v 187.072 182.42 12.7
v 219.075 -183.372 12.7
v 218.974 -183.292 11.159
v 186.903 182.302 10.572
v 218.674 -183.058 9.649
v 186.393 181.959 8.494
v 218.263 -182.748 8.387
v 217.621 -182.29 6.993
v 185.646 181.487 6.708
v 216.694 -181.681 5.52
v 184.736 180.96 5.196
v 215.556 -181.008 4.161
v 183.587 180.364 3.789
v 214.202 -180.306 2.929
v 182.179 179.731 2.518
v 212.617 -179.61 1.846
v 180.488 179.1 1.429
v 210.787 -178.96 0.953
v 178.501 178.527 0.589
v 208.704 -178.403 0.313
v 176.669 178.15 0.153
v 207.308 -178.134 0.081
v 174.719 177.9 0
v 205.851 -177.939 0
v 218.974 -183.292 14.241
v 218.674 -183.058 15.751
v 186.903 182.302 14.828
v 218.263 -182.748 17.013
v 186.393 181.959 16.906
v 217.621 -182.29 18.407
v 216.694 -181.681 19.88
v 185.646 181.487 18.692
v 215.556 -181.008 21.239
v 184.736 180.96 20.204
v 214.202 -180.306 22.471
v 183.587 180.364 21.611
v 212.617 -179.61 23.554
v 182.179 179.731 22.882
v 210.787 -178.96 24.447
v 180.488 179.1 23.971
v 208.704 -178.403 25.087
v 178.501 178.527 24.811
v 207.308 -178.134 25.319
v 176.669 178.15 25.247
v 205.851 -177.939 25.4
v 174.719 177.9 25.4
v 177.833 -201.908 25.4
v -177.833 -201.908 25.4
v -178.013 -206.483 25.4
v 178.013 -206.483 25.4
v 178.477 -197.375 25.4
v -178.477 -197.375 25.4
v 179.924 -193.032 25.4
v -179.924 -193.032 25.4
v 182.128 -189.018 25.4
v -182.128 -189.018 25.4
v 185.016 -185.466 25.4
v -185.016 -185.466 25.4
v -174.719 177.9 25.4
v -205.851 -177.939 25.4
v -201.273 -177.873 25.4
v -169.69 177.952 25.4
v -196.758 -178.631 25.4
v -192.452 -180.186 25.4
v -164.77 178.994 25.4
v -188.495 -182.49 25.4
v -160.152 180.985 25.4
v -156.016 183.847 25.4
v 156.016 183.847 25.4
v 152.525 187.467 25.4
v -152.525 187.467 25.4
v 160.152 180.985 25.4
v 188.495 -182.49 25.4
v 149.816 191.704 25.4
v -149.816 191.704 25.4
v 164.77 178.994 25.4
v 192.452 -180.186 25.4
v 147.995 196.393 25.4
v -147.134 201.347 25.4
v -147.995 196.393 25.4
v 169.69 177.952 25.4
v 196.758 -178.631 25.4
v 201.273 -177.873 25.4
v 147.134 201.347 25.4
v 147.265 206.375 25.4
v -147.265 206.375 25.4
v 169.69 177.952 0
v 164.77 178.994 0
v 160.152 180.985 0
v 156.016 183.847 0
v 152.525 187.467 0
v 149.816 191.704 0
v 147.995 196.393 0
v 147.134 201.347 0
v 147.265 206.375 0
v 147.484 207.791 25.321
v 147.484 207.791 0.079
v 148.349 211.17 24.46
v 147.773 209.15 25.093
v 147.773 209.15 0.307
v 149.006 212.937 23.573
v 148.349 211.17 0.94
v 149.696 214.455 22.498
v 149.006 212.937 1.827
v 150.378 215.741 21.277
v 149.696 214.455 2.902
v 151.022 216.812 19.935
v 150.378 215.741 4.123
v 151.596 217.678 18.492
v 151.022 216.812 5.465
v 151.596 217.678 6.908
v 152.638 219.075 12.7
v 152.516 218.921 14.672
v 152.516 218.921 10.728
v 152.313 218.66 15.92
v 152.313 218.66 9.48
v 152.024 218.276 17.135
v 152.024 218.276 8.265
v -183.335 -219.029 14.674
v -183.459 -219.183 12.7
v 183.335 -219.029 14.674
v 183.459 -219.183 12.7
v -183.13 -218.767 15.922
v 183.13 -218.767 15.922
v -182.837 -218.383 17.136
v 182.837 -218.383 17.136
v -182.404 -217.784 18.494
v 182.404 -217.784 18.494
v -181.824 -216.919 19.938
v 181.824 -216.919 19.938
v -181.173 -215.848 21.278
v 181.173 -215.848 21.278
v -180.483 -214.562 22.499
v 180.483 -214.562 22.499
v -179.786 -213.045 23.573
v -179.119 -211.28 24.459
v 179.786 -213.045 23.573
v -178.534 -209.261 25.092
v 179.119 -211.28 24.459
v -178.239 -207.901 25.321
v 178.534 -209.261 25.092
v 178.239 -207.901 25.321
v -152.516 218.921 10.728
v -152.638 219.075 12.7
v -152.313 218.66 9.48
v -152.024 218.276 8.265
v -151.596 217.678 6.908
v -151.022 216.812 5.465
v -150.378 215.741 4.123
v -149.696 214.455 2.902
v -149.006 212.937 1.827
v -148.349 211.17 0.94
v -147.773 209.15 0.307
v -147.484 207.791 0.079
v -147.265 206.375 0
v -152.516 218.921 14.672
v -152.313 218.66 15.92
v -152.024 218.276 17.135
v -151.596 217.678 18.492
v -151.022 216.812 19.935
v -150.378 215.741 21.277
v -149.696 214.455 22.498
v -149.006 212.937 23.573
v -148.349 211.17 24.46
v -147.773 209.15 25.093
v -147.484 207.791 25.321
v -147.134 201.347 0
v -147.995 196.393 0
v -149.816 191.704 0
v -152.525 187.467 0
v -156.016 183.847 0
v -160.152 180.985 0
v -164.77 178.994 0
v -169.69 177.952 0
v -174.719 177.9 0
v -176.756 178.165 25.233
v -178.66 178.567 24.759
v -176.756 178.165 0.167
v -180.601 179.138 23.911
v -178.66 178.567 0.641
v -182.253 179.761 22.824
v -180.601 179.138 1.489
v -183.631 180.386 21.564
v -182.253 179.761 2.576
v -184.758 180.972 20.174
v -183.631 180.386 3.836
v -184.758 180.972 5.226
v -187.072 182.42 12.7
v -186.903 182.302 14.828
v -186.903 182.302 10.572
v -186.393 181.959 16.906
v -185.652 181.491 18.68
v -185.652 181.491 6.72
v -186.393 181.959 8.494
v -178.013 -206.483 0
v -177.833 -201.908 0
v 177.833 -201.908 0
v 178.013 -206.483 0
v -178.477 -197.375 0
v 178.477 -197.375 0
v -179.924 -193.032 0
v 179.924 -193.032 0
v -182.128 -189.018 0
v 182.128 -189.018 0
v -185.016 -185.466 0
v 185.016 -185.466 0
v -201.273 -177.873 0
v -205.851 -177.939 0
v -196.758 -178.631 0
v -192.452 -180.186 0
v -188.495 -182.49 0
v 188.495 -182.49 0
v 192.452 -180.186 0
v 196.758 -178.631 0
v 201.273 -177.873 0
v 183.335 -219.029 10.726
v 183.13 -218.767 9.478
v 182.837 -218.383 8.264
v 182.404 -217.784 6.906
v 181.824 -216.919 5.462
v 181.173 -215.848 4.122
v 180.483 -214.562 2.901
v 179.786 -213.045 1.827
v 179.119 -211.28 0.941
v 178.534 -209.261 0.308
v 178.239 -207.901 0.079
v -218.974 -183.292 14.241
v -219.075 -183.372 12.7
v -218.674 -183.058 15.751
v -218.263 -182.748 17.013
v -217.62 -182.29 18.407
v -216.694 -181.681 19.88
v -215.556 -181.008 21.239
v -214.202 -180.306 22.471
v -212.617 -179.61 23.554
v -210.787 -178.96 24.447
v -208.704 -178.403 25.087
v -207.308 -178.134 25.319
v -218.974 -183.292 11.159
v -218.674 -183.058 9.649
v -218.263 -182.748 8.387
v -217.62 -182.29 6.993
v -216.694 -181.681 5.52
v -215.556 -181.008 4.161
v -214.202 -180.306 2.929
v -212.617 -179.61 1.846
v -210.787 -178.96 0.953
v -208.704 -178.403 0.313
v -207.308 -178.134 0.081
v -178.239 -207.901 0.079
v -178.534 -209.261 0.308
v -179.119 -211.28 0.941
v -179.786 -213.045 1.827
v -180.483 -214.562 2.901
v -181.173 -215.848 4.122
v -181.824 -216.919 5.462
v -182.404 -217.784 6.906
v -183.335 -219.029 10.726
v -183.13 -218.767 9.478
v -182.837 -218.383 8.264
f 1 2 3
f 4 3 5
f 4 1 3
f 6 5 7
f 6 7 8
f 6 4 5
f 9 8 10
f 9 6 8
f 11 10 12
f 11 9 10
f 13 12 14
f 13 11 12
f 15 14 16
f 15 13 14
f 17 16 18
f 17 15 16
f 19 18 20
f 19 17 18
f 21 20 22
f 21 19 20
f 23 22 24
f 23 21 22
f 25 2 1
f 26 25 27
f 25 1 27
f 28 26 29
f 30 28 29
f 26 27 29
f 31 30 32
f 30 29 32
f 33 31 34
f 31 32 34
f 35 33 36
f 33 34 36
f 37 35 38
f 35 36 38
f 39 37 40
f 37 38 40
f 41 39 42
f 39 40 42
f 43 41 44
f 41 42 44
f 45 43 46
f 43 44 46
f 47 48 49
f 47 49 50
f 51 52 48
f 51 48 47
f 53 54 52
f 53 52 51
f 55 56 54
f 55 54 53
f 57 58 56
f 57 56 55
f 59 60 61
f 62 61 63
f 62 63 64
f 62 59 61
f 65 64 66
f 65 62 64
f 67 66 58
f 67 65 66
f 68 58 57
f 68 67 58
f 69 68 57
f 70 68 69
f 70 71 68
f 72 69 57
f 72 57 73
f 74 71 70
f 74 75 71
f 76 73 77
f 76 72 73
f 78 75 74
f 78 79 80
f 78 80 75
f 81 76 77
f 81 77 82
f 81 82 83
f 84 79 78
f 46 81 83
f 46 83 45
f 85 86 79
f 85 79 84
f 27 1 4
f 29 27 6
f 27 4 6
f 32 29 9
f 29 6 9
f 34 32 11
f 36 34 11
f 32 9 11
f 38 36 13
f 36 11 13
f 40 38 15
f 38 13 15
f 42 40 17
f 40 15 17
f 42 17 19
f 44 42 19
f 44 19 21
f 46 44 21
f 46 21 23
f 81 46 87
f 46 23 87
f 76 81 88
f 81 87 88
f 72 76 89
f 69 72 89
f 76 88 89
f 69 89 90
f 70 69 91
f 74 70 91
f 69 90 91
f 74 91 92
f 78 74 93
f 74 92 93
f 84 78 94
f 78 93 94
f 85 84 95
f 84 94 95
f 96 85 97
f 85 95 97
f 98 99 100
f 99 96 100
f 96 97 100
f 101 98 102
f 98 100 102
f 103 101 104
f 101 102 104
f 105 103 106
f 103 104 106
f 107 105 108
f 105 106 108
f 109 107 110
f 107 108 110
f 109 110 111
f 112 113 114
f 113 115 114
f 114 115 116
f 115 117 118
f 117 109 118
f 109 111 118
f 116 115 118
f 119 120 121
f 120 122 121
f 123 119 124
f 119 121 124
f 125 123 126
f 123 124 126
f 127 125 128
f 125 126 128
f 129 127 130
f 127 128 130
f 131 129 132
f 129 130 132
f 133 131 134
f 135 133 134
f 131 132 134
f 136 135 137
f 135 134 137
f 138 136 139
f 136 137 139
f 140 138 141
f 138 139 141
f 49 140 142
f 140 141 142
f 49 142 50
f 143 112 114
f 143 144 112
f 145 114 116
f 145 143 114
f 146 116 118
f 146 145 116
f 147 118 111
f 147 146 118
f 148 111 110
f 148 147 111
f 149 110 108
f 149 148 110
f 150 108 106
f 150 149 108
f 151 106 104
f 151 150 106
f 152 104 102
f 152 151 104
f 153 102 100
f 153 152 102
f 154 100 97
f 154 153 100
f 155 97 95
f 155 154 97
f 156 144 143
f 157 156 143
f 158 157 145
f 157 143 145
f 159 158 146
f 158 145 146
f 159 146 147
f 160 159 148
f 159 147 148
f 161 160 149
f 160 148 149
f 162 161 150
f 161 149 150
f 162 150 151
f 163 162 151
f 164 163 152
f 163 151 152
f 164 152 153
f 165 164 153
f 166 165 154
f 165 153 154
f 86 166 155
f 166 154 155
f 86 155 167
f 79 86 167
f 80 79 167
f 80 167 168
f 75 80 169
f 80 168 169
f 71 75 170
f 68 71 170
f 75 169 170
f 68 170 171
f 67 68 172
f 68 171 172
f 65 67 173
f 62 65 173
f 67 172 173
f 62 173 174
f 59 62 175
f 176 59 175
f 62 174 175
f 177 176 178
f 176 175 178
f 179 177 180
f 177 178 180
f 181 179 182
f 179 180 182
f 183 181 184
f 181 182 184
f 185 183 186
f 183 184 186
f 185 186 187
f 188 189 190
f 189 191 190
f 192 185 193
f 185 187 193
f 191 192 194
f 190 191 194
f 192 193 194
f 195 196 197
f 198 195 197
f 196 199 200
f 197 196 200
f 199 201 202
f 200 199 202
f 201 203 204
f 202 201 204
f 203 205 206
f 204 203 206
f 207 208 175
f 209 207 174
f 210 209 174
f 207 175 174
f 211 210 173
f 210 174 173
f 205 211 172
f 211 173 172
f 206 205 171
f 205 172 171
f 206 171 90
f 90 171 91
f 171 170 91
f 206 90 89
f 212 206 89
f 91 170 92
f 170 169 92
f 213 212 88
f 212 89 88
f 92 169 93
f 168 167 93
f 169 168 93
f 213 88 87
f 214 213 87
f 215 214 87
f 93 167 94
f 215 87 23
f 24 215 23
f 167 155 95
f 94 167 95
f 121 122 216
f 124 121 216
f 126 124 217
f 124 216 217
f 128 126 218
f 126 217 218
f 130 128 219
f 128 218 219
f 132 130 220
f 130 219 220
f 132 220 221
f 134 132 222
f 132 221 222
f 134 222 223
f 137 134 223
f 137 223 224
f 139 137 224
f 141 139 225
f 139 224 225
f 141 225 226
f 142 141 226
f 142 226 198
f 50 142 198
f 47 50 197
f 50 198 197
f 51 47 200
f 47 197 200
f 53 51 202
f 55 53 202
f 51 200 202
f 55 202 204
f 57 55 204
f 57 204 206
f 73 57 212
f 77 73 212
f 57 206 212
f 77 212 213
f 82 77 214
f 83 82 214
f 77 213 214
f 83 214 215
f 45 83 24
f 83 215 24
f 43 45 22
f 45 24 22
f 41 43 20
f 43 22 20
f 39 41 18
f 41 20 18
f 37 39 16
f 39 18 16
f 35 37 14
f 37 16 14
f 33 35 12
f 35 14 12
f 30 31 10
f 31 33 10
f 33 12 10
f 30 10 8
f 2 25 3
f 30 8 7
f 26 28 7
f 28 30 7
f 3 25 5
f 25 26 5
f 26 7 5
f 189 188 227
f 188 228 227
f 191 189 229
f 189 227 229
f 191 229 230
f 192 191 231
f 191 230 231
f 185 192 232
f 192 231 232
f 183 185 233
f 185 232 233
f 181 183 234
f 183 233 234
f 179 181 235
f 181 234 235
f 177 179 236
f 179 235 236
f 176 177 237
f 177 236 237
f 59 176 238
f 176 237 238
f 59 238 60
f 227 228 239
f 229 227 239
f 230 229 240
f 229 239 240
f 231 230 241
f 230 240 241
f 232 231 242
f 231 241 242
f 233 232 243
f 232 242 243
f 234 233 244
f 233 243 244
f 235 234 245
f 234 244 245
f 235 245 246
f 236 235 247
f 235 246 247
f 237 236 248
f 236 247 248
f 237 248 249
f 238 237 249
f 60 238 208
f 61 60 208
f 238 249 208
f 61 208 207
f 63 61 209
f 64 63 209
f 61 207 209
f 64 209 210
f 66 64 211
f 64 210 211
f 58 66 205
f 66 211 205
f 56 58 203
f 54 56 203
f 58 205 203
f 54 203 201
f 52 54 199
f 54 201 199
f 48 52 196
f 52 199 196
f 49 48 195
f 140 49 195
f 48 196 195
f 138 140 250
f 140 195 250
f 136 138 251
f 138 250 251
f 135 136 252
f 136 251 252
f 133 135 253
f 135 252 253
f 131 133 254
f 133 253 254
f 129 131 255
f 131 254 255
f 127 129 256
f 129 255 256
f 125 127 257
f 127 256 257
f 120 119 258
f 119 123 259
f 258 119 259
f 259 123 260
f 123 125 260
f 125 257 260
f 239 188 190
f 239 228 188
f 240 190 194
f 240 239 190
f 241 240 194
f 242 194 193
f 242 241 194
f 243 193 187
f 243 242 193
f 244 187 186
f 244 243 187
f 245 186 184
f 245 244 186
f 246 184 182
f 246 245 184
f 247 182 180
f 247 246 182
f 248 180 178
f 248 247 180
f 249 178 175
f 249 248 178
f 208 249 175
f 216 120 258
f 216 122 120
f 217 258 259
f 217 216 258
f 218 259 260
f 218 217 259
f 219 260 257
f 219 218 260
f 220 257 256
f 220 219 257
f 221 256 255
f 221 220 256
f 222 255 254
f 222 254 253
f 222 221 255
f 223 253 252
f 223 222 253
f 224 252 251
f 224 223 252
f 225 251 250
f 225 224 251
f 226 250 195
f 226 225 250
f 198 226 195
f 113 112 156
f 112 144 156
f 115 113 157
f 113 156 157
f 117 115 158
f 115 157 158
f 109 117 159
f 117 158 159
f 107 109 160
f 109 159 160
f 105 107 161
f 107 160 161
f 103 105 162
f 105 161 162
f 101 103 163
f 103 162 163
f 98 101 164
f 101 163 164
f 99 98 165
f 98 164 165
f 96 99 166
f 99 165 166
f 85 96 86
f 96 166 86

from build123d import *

# Parameters (mm, degrees)
F1_DEPTH = 25.4
F2_R     = 12.69999


# Not quite as in the source:
# - a fillet or chamfer is up to 0.001 mm smaller than in the source, because OpenCascade refuses the exact size


with BuildPart() as f1:
    # F0 (on Top) → F1 (new body)
    with BuildSketch(Plane.XY):
        with BuildLine():
            ThreePointArc((-219.075, -183.3721313551), (-185.1905403178, -185.2885689585), (-183.4590722629, -219.182983829))
            Line((-183.4590722629, -219.182983829), (183.4590722629, -219.182983829))
            ThreePointArc((183.4590722629, -219.182983829), (185.1905403178, -185.2885689585), (219.075, -183.3721313551))
            Line((219.075, -183.3721313551), (187.072348327, 182.4198510941))
            ThreePointArc((187.072348327, 182.4198510941), (153.9534082329, 185.8090843811), (152.6381313551, 219.075))
            Line((152.6381313551, 219.075), (-152.6381313551, 219.075))
            ThreePointArc((-152.6381313551, 219.075), (-153.9534082329, 185.8090843811), (-187.072348327, 182.4198510941))
            Line((-187.072348327, 182.4198510941), (-219.075, -183.3721313551))
        make_face()
    extrude(amount=F1_DEPTH)

    # F2 (radius 12.7 in the source; OpenCascade refuses exactly that, so slightly less here)
    f2_edges = [f1.edges().sort_by_distance(p)[0] for p in [
        (-203.073674, -0.47614, 25.4),
        (0, 219.075, 25.4),
        (0, -219.182984, 25.4),
        (203.073674, -0.47614, 25.4),
        (-203.073674, -0.47614, 0),
        (0, -219.182984, 0),
        (0, 219.075, 0),
        (203.073674, -0.47614, 0),
    ]]
    fillet(f2_edges, radius=F2_R)


solid = f1.part
